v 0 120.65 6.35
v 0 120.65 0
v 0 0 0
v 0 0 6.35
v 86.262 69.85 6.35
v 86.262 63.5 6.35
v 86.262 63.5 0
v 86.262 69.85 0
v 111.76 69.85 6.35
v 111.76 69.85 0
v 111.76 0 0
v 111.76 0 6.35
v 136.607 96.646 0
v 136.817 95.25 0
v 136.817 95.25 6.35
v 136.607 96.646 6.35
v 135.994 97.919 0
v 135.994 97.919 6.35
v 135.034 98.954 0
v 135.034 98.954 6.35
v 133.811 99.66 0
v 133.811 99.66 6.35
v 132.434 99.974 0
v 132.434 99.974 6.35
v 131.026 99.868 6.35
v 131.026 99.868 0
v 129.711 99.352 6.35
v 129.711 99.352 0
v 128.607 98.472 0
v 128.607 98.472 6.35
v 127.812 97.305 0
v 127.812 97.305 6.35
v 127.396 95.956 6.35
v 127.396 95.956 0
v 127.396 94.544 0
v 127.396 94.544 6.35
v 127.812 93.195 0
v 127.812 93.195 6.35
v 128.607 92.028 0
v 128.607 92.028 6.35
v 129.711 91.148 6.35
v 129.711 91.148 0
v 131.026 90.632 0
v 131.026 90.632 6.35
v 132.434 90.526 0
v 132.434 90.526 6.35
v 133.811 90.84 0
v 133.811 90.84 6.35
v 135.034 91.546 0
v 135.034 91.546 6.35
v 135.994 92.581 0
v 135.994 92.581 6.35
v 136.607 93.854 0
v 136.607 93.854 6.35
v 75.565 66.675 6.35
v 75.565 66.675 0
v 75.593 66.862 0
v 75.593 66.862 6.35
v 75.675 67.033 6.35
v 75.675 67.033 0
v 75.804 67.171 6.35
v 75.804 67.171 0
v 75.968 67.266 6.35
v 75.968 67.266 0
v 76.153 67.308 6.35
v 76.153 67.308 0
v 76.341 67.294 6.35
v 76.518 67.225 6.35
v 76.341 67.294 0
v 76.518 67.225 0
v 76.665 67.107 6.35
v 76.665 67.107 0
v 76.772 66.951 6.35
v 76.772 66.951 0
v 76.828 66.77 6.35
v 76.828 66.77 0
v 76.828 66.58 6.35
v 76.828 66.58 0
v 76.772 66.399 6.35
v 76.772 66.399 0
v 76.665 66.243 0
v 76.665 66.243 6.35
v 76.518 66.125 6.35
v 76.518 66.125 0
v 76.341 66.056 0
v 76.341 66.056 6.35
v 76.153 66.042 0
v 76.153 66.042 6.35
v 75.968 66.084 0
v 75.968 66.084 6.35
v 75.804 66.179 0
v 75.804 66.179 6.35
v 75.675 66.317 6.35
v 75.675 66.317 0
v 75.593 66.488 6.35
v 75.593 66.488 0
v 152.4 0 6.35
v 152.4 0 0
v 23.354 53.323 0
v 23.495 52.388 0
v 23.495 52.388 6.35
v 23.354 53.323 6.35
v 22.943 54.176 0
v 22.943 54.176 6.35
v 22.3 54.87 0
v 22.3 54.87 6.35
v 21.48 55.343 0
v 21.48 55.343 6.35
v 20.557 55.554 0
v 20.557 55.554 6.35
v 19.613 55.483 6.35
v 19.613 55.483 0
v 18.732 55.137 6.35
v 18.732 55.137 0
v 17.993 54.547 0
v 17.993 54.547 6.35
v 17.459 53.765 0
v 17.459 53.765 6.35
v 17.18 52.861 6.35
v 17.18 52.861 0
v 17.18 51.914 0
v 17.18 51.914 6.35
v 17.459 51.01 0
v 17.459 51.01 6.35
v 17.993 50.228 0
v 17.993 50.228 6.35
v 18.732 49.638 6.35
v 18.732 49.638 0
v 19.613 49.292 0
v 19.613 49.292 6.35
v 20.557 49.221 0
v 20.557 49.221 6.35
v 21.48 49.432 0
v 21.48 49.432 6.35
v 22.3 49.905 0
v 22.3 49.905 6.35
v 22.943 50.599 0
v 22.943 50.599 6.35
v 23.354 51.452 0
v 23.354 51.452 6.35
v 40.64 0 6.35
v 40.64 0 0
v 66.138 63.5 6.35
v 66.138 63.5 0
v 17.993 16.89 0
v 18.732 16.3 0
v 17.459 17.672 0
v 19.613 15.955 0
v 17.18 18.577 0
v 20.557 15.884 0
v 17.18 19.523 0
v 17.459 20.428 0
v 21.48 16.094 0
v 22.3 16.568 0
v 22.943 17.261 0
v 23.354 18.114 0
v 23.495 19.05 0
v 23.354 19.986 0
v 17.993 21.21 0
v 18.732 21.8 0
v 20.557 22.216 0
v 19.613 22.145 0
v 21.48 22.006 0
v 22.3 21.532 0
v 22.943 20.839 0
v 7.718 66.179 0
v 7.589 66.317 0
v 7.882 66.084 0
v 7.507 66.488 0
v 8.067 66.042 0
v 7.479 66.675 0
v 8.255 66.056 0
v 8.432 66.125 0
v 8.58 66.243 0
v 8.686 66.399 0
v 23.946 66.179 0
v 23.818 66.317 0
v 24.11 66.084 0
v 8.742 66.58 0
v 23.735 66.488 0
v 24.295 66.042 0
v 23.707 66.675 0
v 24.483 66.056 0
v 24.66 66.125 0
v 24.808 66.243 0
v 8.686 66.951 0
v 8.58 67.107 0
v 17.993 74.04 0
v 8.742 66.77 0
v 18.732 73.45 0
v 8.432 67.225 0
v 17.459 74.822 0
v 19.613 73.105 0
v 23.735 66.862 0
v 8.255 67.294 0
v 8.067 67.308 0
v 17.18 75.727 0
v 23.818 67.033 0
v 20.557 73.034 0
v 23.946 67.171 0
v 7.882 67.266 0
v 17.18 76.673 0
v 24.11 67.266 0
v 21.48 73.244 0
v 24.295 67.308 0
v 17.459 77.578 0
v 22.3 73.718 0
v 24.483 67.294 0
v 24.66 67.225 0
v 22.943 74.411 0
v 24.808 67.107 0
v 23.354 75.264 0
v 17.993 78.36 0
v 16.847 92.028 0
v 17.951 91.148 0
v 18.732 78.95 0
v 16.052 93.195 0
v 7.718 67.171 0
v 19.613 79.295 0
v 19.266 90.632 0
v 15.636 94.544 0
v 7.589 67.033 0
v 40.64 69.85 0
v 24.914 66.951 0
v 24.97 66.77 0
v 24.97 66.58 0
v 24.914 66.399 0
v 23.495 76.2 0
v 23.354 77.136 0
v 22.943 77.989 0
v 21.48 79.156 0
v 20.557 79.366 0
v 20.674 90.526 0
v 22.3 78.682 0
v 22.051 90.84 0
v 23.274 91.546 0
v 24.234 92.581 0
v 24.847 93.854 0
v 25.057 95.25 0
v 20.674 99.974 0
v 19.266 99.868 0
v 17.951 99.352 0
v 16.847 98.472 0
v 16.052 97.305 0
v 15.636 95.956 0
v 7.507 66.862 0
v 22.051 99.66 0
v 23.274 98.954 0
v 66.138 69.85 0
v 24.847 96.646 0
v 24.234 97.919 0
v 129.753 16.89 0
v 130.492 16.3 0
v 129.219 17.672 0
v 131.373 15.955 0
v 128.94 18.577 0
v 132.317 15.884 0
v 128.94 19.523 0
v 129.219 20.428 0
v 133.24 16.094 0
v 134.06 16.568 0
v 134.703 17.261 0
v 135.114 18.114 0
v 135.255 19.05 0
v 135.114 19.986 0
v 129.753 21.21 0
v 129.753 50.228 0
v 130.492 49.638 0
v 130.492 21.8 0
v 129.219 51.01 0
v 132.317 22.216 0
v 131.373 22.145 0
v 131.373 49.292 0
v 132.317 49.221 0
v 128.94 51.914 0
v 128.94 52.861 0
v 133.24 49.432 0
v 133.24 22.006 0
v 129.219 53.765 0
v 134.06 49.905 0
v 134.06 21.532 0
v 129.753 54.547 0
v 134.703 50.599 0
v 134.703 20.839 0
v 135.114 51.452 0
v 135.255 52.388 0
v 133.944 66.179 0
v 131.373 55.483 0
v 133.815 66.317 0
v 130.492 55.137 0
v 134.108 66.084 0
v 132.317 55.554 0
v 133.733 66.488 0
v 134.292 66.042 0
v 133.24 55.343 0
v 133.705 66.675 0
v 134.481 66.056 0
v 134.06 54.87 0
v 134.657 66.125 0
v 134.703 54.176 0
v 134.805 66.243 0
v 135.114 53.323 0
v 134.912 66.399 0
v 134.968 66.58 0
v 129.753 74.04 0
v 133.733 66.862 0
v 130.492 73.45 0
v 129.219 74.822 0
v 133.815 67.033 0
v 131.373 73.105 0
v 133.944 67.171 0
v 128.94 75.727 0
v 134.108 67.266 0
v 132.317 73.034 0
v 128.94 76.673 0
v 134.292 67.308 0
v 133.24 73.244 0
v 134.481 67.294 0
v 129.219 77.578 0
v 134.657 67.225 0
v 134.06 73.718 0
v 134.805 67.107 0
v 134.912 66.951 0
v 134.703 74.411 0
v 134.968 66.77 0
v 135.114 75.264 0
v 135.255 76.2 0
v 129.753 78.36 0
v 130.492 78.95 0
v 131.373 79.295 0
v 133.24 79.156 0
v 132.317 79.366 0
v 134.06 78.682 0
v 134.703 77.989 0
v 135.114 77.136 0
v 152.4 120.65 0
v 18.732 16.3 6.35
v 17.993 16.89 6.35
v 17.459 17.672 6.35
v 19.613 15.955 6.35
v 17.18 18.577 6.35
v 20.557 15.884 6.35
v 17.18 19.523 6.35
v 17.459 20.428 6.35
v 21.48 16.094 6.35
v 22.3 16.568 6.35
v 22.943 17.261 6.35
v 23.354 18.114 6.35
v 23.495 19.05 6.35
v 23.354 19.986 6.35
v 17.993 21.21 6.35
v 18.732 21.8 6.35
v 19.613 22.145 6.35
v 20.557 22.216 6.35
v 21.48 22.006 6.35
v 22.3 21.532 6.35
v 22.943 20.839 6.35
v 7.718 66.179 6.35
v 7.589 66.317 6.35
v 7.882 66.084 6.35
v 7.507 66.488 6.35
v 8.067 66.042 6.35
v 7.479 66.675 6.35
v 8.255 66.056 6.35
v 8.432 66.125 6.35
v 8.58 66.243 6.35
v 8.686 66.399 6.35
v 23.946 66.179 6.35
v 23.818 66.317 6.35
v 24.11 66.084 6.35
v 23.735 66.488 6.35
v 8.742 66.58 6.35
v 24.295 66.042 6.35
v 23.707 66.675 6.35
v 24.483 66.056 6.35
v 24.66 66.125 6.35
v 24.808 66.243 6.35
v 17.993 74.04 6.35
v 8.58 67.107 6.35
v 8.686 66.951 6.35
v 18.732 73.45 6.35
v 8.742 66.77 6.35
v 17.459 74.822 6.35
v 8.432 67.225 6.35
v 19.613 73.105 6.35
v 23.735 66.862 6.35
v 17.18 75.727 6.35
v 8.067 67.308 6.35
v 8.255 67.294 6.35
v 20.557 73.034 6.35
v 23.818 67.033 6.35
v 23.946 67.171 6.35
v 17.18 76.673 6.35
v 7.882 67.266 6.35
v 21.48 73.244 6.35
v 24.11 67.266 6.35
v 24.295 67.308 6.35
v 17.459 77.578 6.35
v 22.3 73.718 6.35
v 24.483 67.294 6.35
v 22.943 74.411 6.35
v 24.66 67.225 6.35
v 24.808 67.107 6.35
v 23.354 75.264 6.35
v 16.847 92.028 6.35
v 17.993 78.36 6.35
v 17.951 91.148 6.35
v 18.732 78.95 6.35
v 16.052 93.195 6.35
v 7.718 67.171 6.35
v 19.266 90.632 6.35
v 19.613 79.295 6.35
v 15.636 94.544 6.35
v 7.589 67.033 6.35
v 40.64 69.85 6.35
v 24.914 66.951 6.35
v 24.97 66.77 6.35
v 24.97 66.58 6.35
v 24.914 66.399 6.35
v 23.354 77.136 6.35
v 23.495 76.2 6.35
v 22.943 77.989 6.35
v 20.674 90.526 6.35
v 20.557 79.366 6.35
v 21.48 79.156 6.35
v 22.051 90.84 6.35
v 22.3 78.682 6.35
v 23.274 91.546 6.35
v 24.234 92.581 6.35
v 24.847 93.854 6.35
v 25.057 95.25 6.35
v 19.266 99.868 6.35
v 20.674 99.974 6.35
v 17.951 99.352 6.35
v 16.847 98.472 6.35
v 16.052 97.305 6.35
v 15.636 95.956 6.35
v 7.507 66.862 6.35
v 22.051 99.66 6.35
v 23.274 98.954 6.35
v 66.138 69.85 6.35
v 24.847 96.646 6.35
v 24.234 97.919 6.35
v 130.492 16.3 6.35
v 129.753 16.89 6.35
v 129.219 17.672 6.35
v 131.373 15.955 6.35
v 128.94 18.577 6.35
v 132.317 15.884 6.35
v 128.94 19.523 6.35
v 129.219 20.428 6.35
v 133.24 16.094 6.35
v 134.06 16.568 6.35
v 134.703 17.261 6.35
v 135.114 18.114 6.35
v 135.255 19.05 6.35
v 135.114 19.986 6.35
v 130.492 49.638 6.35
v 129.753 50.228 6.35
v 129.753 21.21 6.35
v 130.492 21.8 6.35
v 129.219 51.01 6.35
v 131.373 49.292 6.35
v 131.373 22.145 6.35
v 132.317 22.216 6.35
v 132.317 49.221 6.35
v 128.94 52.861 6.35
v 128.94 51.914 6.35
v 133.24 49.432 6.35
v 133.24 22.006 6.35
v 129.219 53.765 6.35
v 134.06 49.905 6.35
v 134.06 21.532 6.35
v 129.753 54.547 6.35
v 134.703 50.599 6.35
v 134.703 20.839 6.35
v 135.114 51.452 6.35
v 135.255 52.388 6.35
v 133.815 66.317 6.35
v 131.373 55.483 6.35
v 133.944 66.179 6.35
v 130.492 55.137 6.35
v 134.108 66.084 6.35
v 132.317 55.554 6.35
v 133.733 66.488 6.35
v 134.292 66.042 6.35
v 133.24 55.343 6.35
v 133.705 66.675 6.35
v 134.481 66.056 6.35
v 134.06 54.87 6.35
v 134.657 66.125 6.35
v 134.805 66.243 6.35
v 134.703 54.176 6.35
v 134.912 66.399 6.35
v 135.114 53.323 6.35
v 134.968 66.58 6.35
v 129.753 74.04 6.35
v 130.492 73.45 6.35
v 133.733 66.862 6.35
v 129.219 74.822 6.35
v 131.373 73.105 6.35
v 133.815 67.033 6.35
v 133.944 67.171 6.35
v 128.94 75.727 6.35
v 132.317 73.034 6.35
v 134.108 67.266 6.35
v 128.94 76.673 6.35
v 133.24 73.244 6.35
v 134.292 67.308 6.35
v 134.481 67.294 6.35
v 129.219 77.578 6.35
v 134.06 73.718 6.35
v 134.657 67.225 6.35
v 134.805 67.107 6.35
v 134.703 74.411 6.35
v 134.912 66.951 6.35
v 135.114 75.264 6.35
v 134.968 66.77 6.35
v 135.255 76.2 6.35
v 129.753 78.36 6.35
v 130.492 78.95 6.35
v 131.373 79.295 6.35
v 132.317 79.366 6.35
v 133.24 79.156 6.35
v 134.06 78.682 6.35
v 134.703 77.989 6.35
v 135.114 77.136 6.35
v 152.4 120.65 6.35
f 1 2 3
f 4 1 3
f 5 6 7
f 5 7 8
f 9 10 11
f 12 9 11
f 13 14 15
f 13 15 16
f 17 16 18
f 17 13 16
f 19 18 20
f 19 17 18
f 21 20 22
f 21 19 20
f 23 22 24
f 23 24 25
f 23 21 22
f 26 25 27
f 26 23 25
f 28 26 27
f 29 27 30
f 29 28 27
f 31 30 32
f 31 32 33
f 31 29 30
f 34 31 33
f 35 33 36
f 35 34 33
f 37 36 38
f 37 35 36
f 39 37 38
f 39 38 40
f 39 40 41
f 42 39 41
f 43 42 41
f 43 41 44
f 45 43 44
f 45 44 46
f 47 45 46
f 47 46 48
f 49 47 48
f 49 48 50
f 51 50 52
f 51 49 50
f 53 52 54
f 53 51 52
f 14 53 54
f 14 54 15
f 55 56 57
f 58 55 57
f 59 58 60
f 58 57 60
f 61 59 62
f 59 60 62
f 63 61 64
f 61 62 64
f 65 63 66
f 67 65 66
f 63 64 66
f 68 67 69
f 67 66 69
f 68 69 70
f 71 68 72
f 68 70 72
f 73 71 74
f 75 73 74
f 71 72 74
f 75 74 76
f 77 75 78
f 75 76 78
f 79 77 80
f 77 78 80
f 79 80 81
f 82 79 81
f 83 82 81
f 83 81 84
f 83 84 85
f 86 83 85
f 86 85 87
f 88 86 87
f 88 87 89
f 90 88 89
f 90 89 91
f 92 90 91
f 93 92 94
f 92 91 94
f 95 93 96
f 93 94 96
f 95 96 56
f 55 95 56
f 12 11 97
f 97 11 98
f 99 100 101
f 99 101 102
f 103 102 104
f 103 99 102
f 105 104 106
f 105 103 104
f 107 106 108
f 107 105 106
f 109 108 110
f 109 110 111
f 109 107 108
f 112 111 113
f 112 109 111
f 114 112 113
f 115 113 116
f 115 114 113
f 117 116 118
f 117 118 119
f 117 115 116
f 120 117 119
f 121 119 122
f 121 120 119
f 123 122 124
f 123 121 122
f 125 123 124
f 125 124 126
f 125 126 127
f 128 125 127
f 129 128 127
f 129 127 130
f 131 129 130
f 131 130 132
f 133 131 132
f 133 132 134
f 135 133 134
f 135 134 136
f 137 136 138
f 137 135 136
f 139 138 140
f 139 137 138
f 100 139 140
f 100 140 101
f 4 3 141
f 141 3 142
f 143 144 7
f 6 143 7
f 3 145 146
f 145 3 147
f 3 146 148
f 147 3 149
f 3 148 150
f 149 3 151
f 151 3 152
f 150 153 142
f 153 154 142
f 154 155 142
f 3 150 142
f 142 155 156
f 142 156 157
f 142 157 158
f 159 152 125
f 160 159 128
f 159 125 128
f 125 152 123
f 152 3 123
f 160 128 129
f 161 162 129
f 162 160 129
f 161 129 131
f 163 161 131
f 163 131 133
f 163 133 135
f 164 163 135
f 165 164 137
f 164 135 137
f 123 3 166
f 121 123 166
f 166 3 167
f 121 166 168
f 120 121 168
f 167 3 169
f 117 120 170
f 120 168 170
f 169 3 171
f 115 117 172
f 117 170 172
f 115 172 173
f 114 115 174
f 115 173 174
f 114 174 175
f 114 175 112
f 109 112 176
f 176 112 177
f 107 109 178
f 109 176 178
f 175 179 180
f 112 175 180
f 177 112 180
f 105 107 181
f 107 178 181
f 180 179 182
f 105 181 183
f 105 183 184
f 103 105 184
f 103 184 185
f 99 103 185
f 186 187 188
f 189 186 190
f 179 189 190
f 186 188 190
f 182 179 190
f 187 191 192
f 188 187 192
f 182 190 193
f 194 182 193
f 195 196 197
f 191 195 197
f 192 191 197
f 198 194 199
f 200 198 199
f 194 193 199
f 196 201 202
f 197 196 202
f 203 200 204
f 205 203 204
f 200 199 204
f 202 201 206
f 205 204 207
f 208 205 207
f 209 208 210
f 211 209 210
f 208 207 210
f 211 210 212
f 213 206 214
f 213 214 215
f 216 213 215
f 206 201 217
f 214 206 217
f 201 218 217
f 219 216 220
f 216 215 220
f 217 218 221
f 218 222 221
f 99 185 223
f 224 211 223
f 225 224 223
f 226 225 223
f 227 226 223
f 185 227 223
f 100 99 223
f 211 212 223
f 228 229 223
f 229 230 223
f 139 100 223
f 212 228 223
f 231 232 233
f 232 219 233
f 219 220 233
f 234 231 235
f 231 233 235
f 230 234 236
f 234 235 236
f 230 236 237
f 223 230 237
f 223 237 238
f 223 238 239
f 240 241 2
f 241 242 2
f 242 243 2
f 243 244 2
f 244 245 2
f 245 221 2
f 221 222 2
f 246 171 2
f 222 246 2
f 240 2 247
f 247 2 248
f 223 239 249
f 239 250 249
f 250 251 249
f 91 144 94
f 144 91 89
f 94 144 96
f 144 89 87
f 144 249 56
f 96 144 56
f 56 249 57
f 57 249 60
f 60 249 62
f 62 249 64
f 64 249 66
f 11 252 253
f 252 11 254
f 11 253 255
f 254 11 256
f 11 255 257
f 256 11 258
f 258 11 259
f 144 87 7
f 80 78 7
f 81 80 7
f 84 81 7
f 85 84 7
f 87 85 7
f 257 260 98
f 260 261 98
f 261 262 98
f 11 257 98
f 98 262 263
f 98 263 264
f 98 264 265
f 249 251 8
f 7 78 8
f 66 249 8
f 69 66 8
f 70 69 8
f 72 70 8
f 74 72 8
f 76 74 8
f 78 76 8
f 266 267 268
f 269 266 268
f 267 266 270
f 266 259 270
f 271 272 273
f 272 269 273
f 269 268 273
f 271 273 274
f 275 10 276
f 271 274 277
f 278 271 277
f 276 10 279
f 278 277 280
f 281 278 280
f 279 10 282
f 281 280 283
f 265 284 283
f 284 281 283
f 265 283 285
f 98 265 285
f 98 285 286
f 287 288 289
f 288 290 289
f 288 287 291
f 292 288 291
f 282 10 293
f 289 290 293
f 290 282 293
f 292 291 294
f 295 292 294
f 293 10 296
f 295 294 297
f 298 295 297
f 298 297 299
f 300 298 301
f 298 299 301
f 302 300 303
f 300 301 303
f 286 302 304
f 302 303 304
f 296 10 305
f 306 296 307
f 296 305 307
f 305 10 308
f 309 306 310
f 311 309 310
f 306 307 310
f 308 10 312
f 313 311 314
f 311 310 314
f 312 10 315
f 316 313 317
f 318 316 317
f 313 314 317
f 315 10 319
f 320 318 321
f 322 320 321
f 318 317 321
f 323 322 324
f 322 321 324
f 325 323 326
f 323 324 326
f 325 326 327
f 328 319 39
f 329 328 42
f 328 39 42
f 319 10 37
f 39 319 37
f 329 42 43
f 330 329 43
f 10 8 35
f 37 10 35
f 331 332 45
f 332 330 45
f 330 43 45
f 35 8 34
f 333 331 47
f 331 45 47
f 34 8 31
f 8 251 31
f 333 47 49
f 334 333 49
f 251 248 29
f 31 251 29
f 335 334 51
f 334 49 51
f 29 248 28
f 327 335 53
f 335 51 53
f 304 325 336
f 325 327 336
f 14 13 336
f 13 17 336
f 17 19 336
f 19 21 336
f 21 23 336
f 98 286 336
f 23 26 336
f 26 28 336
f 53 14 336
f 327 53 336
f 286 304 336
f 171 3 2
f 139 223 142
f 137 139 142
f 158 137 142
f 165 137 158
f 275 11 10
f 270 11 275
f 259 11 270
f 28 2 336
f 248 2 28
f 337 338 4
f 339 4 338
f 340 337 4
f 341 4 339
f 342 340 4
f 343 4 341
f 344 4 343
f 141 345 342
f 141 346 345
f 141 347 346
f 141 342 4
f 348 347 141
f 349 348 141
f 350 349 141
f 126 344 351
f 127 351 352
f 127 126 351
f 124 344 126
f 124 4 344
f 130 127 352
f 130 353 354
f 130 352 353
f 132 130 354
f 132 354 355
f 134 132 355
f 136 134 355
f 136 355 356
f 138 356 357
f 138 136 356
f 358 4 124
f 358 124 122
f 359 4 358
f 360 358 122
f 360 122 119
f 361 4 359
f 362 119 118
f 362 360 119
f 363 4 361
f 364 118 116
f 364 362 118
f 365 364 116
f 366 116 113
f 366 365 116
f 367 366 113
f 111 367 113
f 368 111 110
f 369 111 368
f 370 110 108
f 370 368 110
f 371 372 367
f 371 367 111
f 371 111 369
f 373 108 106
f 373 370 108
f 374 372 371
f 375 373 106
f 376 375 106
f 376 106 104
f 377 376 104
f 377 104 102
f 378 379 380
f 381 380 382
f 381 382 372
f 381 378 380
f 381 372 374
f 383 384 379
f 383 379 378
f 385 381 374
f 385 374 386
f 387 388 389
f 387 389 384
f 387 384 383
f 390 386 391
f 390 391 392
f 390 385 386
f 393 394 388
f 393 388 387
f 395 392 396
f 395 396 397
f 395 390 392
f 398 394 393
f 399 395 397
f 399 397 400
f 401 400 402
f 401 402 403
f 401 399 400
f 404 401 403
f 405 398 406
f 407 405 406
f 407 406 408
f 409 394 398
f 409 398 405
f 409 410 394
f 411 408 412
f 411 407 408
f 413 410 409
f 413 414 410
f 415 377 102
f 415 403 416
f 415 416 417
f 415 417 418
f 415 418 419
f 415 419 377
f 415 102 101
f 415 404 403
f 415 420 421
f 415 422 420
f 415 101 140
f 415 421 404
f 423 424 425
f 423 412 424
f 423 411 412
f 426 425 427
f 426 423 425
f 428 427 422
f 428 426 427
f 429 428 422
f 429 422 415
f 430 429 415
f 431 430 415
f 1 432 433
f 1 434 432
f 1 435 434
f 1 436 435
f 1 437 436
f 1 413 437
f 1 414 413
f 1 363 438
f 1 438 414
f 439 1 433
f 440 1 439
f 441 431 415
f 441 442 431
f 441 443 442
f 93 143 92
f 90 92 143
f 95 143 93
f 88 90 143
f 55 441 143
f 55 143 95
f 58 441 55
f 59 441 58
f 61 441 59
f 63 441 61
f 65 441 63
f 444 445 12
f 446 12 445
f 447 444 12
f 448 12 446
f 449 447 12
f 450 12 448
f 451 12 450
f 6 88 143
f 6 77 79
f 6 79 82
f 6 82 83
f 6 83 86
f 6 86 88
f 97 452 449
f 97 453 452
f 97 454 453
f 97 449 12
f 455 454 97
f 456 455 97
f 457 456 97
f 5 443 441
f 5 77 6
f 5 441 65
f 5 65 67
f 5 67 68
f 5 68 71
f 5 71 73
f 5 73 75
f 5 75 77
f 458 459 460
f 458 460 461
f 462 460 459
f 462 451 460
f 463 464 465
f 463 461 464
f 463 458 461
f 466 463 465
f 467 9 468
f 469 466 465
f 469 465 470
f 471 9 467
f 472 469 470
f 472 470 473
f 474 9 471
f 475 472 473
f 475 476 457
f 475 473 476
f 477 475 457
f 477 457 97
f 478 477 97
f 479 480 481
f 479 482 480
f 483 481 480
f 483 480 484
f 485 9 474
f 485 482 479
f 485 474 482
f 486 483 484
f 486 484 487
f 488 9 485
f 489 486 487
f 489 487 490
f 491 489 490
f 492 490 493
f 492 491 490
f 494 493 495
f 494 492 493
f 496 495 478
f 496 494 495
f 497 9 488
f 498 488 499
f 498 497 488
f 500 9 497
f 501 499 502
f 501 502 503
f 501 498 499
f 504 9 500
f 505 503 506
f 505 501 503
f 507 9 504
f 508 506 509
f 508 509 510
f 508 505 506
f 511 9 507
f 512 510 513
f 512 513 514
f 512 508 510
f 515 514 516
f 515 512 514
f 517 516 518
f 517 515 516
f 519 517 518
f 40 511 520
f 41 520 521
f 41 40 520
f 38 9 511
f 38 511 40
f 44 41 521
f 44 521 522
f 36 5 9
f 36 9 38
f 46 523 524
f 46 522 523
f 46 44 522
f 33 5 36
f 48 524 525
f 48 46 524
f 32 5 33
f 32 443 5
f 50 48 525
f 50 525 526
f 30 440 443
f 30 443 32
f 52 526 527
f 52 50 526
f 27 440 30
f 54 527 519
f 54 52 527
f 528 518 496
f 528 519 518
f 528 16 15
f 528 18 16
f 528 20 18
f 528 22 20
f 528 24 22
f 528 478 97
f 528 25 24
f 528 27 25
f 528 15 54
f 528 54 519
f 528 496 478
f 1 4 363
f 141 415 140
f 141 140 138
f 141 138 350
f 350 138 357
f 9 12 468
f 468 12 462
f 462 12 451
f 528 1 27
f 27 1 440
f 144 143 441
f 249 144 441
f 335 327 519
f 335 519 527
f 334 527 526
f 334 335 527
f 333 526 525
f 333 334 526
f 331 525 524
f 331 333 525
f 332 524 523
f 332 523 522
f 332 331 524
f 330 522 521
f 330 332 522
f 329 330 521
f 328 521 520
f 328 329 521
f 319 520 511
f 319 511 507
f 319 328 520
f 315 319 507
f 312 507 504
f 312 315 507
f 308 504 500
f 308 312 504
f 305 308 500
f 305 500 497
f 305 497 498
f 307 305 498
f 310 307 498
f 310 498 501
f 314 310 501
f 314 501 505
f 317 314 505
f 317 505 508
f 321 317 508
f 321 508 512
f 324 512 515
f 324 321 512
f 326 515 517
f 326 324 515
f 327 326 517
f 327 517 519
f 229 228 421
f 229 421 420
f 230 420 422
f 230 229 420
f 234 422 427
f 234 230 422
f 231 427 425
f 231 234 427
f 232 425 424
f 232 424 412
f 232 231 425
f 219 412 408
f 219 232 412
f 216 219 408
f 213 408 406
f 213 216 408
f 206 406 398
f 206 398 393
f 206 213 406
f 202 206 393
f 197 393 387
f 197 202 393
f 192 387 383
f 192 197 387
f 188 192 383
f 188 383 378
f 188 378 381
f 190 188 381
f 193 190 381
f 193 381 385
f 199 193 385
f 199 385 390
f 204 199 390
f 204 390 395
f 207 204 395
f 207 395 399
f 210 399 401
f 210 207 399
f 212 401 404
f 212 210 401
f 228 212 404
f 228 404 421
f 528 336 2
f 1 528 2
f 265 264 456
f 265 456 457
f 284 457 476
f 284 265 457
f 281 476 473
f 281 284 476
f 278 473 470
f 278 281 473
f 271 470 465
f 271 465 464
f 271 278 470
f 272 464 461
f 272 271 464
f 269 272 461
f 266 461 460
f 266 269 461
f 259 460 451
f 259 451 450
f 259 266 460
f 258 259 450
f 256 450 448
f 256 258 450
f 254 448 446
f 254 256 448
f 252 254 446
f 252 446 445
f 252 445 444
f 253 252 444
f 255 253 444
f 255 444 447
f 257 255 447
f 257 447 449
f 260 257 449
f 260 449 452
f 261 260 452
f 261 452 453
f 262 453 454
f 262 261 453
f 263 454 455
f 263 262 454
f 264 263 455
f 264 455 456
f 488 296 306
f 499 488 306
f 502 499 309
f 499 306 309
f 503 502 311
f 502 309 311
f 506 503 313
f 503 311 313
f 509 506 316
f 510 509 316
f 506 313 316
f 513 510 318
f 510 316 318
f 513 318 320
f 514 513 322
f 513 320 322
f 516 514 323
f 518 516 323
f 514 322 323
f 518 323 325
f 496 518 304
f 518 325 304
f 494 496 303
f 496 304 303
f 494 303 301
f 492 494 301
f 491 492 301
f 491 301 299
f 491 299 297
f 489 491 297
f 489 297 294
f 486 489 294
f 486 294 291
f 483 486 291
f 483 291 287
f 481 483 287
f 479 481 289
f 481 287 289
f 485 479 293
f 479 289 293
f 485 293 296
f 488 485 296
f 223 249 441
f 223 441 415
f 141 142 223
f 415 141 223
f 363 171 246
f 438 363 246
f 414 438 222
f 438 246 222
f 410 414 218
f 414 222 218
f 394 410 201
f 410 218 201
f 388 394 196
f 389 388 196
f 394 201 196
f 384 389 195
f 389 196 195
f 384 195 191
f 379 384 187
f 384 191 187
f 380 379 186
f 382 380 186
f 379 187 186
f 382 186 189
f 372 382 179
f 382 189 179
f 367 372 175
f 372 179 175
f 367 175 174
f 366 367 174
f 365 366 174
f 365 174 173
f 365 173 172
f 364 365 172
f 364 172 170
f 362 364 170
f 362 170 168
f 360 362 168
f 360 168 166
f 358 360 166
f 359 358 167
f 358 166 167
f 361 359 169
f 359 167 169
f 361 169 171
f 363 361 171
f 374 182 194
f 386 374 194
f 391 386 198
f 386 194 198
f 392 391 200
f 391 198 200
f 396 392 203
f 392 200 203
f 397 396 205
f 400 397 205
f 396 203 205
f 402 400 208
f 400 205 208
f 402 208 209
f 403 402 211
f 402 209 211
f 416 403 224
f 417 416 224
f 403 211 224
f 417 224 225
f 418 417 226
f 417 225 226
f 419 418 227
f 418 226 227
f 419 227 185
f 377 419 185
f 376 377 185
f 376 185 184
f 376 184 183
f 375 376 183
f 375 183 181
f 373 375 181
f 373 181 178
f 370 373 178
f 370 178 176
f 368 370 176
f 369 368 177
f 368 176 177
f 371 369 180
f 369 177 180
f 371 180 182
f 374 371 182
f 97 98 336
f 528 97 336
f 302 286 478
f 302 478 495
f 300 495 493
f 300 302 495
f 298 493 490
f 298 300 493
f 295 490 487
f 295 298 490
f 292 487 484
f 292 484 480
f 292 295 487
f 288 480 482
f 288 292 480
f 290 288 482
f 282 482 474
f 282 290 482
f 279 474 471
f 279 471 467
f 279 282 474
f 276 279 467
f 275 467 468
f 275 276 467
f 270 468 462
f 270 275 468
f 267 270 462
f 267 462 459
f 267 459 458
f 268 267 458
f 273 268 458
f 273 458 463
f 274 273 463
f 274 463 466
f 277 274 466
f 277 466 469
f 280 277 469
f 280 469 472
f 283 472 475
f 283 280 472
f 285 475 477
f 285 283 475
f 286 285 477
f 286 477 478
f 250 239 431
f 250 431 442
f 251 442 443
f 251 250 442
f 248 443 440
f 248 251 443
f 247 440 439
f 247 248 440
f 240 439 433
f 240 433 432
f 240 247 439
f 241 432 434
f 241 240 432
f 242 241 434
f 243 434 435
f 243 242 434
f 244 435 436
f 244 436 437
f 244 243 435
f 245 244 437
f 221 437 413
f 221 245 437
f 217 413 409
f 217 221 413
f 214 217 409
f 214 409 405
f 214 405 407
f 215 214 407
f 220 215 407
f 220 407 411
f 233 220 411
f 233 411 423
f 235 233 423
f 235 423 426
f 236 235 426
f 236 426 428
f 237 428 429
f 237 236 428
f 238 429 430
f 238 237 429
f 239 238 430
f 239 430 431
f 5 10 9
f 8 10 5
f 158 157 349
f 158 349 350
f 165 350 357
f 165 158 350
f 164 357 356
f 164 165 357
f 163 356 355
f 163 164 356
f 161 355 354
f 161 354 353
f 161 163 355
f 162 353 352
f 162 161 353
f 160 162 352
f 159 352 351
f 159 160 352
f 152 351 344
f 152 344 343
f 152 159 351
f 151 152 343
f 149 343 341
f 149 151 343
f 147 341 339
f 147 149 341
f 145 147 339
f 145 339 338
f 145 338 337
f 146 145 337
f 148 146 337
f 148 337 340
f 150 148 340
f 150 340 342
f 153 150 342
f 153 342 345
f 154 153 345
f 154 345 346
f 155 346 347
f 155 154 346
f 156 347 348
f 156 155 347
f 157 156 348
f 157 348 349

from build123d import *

# Parameters (mm, degrees)
SKETCH1_R           = 4.7371
SKETCH1_R_2         = 3.175
BOSS_EXTRUDE1_DEPTH = 6.35
SKETCH2_W           = 25.498289586
SKETCH2_H           = 6.35
CUT_EXTRUDE1_DEPTH  = 6.35
SKETCH3_R           = 0.635
CUT_EXTRUDE2_DEPTH  = 6.35


with BuildPart() as part:
    # Sketch1 → Boss-Extrude1 (new body)
    with BuildSketch(Plane.XY):
        Polygon((0, 0), (40.64, 0), (40.64, 63.5), (111.76, 63.5), (111.76, 0), (152.4, 0), (152.4, 69.85), (152.4, 120.65), (111.76, 120.65), (40.64, 120.65), (0, 120.65), (0, 69.85), align=None)
        with Locations((20.32, 95.25)):
            Circle(SKETCH1_R, mode=Mode.SUBTRACT)
        with Locations((132.08, 95.25)):
            Circle(SKETCH1_R, mode=Mode.SUBTRACT)
        with Locations((132.08, 76.2)):
            Circle(SKETCH1_R_2, mode=Mode.SUBTRACT)
        with Locations((20.32, 76.2)):
            Circle(SKETCH1_R_2, mode=Mode.SUBTRACT)
        with Locations((20.32, 52.3875)):
            Circle(SKETCH1_R_2, mode=Mode.SUBTRACT)
        with Locations((132.08, 52.3875)):
            Circle(SKETCH1_R_2, mode=Mode.SUBTRACT)
        with Locations((20.32, 19.05)):
            Circle(SKETCH1_R_2, mode=Mode.SUBTRACT)
        with Locations((132.08, 19.05)):
            Circle(SKETCH1_R_2, mode=Mode.SUBTRACT)
    extrude(amount=BOSS_EXTRUDE1_DEPTH)

    # Sketch2 → Cut-Extrude1 (cut)
    with BuildSketch(Plane(origin=(0, 0, 0), x_dir=(-1, 0, 0), z_dir=(0, 0, -1))):
        with Locations((-99.010855207, 66.675)):
            Rectangle(SKETCH2_W, SKETCH2_H)
        with Locations((-53.389144793, 66.675)):
            Rectangle(SKETCH2_W, SKETCH2_H)
    extrude(amount=-CUT_EXTRUDE1_DEPTH, mode=Mode.SUBTRACT)

    # Sketch3 → Cut-Extrude2 (cut)
    with BuildSketch(Plane(origin=(0, 0, 0), x_dir=(-1, 0, 0), z_dir=(0, 0, -1))):
        with Locations((-134.339930145, 66.675)):
            Circle(SKETCH3_R)
        with Locations((-98.219790435, 66.675)):
            Circle(SKETCH3_R)
        with Locations((-24.342185699, 66.675)):
            Circle(SKETCH3_R)
        with Locations((-76.2, 66.675)):
            Circle(SKETCH3_R)
        with Locations((-8.1140619, 66.675)):
            Circle(SKETCH3_R)
    extrude(amount=-CUT_EXTRUDE2_DEPTH, mode=Mode.SUBTRACT)


solid = part.part
